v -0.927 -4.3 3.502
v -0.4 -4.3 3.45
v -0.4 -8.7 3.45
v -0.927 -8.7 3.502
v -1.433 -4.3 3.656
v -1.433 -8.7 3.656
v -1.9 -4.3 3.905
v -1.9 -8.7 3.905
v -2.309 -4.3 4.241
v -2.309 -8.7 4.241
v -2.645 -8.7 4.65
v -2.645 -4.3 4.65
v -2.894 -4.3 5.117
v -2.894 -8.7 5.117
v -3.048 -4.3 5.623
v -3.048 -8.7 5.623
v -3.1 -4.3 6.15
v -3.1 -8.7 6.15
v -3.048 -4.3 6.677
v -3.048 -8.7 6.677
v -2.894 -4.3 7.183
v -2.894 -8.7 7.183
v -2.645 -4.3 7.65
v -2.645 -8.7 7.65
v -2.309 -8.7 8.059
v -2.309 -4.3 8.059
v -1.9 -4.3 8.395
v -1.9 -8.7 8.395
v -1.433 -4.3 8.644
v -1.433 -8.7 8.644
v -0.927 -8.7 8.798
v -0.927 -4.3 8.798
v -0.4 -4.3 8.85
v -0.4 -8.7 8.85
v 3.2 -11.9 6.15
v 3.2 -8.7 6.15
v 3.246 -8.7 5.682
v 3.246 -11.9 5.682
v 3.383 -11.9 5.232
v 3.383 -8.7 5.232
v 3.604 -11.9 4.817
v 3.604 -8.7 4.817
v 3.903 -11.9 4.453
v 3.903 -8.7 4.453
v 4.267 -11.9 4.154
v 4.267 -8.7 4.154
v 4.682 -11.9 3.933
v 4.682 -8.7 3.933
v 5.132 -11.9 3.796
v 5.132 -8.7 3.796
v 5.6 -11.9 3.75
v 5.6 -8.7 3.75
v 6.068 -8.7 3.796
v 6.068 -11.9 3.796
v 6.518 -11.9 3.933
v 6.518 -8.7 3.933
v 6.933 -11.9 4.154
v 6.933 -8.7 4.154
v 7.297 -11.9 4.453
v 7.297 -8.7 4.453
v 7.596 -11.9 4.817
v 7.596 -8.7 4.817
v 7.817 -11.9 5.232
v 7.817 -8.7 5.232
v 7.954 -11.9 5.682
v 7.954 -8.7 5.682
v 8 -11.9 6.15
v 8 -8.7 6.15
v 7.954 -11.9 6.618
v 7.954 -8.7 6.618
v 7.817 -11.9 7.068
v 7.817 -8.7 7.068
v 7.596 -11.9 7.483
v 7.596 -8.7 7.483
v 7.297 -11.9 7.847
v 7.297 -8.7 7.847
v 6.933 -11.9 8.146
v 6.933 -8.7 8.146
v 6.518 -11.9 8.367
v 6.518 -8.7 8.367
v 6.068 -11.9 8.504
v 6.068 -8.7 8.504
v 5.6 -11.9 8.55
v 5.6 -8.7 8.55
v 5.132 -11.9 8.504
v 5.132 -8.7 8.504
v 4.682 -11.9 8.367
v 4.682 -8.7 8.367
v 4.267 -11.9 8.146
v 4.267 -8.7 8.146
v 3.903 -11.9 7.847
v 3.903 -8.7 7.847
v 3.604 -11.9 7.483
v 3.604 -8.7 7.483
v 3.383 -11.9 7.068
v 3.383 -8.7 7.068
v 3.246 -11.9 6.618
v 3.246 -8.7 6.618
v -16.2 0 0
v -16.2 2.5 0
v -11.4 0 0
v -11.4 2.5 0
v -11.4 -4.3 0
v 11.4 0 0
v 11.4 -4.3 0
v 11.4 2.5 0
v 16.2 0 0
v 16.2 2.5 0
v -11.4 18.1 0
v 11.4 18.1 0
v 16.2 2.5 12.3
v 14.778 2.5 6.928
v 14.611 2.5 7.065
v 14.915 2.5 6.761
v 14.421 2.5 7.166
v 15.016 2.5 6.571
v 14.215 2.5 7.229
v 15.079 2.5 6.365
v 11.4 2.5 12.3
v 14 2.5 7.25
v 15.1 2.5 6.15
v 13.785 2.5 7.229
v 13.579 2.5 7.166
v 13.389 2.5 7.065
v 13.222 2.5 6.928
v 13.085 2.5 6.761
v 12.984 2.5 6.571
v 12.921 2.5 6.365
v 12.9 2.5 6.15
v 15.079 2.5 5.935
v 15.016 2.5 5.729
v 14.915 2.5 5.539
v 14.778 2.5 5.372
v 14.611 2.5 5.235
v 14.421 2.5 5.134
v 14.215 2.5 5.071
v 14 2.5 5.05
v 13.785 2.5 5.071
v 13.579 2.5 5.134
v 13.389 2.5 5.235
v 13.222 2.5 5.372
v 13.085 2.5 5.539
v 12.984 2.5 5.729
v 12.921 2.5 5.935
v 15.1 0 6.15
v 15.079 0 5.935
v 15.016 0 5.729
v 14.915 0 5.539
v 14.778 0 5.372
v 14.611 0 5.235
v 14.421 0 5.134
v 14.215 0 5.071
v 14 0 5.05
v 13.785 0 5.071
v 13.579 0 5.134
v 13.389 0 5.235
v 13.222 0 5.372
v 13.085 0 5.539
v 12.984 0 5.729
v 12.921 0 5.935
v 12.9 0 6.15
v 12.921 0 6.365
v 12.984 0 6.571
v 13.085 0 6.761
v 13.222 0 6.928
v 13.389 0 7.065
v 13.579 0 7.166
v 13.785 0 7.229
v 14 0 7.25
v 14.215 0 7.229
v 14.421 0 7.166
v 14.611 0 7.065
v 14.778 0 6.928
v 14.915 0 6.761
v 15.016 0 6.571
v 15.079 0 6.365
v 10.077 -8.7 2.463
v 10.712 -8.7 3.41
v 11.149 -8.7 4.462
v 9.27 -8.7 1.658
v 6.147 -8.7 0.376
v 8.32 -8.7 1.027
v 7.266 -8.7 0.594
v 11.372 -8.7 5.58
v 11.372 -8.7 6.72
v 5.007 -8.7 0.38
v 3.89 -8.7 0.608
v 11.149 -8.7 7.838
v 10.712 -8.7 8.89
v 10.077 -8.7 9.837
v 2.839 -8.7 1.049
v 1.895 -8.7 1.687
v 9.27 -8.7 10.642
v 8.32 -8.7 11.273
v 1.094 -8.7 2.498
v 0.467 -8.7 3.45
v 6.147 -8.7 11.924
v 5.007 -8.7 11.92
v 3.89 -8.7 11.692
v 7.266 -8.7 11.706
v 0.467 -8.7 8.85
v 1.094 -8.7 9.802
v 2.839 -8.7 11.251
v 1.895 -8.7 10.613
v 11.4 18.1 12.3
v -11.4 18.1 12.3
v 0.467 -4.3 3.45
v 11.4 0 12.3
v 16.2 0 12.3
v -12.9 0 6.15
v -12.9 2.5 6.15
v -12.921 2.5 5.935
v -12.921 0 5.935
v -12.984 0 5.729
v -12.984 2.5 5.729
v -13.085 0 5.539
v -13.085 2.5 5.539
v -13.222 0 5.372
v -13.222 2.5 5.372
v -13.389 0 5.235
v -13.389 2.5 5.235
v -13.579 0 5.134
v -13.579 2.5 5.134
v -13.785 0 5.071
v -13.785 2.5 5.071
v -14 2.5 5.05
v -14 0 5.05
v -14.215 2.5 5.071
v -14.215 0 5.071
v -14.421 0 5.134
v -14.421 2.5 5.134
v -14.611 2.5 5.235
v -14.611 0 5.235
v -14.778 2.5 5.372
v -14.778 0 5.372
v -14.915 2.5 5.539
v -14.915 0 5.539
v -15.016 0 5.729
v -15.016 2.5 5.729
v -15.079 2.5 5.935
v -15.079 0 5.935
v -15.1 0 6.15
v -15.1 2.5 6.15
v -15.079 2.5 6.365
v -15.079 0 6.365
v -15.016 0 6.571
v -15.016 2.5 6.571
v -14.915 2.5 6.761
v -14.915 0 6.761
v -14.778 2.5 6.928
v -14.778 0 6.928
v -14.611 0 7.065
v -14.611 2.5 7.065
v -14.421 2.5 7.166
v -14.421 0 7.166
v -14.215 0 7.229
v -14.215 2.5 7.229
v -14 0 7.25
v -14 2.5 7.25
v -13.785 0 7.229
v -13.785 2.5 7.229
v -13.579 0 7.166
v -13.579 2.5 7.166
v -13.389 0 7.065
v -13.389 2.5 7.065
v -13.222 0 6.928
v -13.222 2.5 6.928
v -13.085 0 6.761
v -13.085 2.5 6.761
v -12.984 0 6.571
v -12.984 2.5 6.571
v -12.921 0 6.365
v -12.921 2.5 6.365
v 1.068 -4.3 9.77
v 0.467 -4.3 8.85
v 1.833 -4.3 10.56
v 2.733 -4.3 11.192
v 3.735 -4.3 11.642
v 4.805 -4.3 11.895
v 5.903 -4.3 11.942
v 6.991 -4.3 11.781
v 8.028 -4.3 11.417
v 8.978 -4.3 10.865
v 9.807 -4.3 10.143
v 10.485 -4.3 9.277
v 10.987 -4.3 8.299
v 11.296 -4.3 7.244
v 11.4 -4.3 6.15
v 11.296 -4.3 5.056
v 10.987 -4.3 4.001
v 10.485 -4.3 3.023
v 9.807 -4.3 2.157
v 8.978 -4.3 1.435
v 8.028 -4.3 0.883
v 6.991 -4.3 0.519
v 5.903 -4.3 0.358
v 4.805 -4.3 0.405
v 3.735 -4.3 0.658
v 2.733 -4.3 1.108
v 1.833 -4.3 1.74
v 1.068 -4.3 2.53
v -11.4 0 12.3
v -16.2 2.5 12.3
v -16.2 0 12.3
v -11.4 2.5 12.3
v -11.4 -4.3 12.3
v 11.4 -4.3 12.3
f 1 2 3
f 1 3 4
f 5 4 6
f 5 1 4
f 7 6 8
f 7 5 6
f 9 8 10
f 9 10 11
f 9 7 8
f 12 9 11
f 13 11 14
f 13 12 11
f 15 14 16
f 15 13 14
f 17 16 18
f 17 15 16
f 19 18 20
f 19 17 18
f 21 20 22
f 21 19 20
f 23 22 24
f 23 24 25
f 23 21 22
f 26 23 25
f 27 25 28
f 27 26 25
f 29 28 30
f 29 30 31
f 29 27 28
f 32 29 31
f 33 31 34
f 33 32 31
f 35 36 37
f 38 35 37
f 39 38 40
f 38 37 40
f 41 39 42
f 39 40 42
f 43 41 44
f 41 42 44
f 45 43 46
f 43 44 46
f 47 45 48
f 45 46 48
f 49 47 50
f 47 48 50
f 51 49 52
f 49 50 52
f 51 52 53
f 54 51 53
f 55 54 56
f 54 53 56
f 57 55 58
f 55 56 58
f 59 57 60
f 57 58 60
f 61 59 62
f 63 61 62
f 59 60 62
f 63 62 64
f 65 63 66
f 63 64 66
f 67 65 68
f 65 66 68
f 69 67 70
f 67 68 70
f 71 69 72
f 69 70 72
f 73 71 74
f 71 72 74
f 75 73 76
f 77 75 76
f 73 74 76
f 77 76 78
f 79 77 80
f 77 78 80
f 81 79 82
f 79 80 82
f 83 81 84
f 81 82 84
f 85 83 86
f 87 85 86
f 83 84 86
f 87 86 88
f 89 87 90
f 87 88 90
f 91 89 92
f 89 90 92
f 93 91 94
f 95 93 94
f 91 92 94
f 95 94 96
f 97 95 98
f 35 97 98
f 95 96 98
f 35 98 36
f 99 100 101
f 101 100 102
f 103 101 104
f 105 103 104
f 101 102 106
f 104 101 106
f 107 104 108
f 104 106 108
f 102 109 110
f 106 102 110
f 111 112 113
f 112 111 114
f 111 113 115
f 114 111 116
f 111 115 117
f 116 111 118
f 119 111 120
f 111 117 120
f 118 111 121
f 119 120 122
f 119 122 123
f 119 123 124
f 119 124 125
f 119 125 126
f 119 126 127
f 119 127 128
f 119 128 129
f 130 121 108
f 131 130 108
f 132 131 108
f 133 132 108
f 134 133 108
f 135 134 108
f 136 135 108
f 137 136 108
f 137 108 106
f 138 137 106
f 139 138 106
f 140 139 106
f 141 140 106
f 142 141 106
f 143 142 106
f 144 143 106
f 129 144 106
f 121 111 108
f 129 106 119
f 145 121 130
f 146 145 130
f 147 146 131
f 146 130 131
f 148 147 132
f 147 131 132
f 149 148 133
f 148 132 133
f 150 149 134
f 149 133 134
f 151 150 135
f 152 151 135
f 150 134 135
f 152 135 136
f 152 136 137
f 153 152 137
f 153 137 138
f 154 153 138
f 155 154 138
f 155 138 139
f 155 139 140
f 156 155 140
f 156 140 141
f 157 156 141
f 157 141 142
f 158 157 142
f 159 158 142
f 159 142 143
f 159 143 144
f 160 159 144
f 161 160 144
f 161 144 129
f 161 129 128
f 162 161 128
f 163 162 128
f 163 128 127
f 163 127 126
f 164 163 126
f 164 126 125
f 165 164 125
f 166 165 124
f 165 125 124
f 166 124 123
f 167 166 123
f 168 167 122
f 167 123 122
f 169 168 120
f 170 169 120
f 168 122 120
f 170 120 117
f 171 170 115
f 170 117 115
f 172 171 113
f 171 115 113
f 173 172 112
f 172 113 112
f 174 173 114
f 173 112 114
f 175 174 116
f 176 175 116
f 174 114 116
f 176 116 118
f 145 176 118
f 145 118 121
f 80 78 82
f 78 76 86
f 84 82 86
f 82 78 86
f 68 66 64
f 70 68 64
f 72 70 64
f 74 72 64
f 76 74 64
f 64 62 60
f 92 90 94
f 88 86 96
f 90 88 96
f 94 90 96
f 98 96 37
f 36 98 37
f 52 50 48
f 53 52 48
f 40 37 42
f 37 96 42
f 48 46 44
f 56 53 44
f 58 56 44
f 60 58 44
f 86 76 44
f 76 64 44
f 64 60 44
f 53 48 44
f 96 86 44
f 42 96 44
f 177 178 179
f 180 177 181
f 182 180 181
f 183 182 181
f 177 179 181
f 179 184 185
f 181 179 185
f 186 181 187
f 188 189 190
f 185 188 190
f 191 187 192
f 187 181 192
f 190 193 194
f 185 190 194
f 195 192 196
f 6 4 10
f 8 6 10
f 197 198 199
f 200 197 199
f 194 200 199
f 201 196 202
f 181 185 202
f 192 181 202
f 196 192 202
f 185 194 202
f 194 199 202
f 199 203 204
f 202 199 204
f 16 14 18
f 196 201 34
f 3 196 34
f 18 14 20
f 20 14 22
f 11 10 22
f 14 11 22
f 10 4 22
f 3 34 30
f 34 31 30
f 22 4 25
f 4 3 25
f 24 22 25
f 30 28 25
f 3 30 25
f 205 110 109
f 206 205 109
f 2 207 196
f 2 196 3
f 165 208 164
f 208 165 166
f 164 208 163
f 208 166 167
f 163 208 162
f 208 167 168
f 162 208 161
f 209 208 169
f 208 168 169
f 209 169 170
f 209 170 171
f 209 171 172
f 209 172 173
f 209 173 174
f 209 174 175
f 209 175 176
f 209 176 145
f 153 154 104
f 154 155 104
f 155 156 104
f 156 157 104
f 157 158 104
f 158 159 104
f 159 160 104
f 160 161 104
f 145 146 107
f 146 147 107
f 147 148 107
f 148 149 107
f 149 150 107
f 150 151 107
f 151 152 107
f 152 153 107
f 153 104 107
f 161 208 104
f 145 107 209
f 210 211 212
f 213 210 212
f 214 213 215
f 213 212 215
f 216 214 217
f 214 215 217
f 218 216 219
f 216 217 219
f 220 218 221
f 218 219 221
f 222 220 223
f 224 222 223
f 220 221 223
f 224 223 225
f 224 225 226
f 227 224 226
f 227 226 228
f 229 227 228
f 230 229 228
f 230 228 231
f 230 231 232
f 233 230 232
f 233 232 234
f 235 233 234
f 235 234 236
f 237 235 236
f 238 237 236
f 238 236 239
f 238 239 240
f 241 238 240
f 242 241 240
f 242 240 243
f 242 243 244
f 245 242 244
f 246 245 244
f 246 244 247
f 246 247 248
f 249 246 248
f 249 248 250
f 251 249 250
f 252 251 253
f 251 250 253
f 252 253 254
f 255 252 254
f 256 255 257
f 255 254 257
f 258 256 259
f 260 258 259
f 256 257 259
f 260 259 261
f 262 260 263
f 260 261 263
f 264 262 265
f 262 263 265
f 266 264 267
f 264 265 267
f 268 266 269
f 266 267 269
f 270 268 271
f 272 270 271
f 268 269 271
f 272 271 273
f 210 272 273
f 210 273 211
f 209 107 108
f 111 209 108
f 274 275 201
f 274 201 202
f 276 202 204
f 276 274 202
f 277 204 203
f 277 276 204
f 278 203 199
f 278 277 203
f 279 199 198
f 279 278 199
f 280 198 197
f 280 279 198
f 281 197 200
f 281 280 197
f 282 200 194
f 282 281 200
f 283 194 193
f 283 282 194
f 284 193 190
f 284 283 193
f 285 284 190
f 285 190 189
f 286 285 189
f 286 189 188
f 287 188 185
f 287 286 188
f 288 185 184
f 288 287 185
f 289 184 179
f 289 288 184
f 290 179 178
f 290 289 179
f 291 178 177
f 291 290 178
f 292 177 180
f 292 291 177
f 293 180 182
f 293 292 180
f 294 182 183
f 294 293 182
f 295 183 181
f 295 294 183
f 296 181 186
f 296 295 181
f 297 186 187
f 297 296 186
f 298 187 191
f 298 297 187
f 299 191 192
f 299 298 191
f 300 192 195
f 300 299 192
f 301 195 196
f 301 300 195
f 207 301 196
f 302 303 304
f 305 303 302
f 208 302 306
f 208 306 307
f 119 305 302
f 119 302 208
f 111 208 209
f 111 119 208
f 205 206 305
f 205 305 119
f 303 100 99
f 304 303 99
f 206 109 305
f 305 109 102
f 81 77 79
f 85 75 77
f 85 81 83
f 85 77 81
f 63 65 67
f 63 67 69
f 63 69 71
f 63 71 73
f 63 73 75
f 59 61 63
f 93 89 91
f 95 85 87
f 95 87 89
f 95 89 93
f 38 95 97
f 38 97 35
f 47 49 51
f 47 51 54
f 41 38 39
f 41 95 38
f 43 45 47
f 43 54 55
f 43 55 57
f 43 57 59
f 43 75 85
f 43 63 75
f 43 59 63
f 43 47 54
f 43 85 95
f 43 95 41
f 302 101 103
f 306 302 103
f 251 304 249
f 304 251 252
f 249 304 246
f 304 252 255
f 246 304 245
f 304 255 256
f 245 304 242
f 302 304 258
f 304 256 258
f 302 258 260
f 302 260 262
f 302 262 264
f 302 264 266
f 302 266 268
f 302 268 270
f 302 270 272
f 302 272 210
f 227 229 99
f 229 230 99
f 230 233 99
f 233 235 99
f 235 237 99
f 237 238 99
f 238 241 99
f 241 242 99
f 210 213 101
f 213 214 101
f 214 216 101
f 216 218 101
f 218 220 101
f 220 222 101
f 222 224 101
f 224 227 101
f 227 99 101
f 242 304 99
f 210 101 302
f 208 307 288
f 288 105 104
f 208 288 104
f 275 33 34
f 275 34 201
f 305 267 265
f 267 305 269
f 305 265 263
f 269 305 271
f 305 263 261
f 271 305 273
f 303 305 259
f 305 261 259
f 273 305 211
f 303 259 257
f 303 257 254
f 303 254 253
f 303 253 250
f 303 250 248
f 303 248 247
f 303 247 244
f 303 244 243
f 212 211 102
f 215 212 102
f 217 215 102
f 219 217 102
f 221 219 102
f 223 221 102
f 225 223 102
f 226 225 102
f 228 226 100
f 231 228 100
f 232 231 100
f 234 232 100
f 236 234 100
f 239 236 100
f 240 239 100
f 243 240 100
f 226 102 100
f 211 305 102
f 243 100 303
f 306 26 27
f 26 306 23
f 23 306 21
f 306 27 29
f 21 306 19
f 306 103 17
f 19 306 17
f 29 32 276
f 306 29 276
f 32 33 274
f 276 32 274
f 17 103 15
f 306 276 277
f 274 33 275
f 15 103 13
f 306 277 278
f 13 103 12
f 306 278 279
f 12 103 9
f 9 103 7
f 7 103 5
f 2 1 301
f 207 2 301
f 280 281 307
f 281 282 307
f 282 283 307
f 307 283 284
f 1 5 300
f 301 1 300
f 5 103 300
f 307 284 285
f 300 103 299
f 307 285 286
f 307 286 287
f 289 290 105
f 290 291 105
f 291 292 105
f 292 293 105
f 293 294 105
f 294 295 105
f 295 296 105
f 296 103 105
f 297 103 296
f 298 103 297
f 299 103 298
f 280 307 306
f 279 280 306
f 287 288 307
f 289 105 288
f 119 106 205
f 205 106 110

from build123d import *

# Parameters (mm, degrees)
BOSS_EXTRUDE1_DEPTH = 12.3
BOSS_EXTRUDE2_DEPTH = 4.4
SKETCH3_R           = 1.1
CUT_EXTRUDE1_DEPTH  = 8
SKETCH_1_R          = 2.4
EXTRUDE_1_DEPTH     = 3.2


with BuildPart() as part:
    # Sketch1 → Boss-Extrude1 (new body)
    with BuildSketch(Plane.XY):
        Polygon((-16.2, 0), (-11.4, 0), (-11.4, -4.3), (11.4, -4.3), (11.4, 0), (16.2, 0), (16.2, 2.5), (11.4, 2.5), (11.4, 18.1), (-11.4, 18.1), (-11.4, 2.5), (-16.2, 2.5), align=None)
    extrude(amount=BOSS_EXTRUDE1_DEPTH)

    # Sketch2 → Boss-Extrude2 (add)
    with BuildSketch(Plane.XZ.offset(4.3)):
        with BuildLine():
            Line((-0.4, 8.85), (0.466774893, 8.85))
            ThreePointArc((0.466774893, 8.85), (11.4, 6.15), (0.466774893, 3.45))
            Line((0.466774893, 3.45), (-0.4, 3.45))
            ThreePointArc((-0.4, 3.45), (-3.1, 6.15), (-0.4, 8.85))
        make_face()
    extrude(amount=BOSS_EXTRUDE2_DEPTH)

    # Sketch3 → Cut-Extrude1 (cut)
    with BuildSketch(Plane(origin=(0, 2.5, 0), x_dir=(1, 0, 0), z_dir=(0, 1, 0))):
        with Locations((-14, -6.15)):
            Circle(SKETCH3_R)
        with Locations((14, -6.15)):
            Circle(SKETCH3_R)
    extrude(amount=-CUT_EXTRUDE1_DEPTH, mode=Mode.SUBTRACT)


with BuildPart() as body_2:
    # 草圖1 → 填料-伸長1 (new body)
    with BuildSketch(Plane(origin=(0, -8.7, 0), x_dir=(-1, 0, 0), z_dir=(0, -1, 0))):
        with Locations((-5.6, -6.15)):
            Circle(SKETCH_1_R)
    extrude(amount=EXTRUDE_1_DEPTH)


solid = Compound([part.part, body_2.part])
